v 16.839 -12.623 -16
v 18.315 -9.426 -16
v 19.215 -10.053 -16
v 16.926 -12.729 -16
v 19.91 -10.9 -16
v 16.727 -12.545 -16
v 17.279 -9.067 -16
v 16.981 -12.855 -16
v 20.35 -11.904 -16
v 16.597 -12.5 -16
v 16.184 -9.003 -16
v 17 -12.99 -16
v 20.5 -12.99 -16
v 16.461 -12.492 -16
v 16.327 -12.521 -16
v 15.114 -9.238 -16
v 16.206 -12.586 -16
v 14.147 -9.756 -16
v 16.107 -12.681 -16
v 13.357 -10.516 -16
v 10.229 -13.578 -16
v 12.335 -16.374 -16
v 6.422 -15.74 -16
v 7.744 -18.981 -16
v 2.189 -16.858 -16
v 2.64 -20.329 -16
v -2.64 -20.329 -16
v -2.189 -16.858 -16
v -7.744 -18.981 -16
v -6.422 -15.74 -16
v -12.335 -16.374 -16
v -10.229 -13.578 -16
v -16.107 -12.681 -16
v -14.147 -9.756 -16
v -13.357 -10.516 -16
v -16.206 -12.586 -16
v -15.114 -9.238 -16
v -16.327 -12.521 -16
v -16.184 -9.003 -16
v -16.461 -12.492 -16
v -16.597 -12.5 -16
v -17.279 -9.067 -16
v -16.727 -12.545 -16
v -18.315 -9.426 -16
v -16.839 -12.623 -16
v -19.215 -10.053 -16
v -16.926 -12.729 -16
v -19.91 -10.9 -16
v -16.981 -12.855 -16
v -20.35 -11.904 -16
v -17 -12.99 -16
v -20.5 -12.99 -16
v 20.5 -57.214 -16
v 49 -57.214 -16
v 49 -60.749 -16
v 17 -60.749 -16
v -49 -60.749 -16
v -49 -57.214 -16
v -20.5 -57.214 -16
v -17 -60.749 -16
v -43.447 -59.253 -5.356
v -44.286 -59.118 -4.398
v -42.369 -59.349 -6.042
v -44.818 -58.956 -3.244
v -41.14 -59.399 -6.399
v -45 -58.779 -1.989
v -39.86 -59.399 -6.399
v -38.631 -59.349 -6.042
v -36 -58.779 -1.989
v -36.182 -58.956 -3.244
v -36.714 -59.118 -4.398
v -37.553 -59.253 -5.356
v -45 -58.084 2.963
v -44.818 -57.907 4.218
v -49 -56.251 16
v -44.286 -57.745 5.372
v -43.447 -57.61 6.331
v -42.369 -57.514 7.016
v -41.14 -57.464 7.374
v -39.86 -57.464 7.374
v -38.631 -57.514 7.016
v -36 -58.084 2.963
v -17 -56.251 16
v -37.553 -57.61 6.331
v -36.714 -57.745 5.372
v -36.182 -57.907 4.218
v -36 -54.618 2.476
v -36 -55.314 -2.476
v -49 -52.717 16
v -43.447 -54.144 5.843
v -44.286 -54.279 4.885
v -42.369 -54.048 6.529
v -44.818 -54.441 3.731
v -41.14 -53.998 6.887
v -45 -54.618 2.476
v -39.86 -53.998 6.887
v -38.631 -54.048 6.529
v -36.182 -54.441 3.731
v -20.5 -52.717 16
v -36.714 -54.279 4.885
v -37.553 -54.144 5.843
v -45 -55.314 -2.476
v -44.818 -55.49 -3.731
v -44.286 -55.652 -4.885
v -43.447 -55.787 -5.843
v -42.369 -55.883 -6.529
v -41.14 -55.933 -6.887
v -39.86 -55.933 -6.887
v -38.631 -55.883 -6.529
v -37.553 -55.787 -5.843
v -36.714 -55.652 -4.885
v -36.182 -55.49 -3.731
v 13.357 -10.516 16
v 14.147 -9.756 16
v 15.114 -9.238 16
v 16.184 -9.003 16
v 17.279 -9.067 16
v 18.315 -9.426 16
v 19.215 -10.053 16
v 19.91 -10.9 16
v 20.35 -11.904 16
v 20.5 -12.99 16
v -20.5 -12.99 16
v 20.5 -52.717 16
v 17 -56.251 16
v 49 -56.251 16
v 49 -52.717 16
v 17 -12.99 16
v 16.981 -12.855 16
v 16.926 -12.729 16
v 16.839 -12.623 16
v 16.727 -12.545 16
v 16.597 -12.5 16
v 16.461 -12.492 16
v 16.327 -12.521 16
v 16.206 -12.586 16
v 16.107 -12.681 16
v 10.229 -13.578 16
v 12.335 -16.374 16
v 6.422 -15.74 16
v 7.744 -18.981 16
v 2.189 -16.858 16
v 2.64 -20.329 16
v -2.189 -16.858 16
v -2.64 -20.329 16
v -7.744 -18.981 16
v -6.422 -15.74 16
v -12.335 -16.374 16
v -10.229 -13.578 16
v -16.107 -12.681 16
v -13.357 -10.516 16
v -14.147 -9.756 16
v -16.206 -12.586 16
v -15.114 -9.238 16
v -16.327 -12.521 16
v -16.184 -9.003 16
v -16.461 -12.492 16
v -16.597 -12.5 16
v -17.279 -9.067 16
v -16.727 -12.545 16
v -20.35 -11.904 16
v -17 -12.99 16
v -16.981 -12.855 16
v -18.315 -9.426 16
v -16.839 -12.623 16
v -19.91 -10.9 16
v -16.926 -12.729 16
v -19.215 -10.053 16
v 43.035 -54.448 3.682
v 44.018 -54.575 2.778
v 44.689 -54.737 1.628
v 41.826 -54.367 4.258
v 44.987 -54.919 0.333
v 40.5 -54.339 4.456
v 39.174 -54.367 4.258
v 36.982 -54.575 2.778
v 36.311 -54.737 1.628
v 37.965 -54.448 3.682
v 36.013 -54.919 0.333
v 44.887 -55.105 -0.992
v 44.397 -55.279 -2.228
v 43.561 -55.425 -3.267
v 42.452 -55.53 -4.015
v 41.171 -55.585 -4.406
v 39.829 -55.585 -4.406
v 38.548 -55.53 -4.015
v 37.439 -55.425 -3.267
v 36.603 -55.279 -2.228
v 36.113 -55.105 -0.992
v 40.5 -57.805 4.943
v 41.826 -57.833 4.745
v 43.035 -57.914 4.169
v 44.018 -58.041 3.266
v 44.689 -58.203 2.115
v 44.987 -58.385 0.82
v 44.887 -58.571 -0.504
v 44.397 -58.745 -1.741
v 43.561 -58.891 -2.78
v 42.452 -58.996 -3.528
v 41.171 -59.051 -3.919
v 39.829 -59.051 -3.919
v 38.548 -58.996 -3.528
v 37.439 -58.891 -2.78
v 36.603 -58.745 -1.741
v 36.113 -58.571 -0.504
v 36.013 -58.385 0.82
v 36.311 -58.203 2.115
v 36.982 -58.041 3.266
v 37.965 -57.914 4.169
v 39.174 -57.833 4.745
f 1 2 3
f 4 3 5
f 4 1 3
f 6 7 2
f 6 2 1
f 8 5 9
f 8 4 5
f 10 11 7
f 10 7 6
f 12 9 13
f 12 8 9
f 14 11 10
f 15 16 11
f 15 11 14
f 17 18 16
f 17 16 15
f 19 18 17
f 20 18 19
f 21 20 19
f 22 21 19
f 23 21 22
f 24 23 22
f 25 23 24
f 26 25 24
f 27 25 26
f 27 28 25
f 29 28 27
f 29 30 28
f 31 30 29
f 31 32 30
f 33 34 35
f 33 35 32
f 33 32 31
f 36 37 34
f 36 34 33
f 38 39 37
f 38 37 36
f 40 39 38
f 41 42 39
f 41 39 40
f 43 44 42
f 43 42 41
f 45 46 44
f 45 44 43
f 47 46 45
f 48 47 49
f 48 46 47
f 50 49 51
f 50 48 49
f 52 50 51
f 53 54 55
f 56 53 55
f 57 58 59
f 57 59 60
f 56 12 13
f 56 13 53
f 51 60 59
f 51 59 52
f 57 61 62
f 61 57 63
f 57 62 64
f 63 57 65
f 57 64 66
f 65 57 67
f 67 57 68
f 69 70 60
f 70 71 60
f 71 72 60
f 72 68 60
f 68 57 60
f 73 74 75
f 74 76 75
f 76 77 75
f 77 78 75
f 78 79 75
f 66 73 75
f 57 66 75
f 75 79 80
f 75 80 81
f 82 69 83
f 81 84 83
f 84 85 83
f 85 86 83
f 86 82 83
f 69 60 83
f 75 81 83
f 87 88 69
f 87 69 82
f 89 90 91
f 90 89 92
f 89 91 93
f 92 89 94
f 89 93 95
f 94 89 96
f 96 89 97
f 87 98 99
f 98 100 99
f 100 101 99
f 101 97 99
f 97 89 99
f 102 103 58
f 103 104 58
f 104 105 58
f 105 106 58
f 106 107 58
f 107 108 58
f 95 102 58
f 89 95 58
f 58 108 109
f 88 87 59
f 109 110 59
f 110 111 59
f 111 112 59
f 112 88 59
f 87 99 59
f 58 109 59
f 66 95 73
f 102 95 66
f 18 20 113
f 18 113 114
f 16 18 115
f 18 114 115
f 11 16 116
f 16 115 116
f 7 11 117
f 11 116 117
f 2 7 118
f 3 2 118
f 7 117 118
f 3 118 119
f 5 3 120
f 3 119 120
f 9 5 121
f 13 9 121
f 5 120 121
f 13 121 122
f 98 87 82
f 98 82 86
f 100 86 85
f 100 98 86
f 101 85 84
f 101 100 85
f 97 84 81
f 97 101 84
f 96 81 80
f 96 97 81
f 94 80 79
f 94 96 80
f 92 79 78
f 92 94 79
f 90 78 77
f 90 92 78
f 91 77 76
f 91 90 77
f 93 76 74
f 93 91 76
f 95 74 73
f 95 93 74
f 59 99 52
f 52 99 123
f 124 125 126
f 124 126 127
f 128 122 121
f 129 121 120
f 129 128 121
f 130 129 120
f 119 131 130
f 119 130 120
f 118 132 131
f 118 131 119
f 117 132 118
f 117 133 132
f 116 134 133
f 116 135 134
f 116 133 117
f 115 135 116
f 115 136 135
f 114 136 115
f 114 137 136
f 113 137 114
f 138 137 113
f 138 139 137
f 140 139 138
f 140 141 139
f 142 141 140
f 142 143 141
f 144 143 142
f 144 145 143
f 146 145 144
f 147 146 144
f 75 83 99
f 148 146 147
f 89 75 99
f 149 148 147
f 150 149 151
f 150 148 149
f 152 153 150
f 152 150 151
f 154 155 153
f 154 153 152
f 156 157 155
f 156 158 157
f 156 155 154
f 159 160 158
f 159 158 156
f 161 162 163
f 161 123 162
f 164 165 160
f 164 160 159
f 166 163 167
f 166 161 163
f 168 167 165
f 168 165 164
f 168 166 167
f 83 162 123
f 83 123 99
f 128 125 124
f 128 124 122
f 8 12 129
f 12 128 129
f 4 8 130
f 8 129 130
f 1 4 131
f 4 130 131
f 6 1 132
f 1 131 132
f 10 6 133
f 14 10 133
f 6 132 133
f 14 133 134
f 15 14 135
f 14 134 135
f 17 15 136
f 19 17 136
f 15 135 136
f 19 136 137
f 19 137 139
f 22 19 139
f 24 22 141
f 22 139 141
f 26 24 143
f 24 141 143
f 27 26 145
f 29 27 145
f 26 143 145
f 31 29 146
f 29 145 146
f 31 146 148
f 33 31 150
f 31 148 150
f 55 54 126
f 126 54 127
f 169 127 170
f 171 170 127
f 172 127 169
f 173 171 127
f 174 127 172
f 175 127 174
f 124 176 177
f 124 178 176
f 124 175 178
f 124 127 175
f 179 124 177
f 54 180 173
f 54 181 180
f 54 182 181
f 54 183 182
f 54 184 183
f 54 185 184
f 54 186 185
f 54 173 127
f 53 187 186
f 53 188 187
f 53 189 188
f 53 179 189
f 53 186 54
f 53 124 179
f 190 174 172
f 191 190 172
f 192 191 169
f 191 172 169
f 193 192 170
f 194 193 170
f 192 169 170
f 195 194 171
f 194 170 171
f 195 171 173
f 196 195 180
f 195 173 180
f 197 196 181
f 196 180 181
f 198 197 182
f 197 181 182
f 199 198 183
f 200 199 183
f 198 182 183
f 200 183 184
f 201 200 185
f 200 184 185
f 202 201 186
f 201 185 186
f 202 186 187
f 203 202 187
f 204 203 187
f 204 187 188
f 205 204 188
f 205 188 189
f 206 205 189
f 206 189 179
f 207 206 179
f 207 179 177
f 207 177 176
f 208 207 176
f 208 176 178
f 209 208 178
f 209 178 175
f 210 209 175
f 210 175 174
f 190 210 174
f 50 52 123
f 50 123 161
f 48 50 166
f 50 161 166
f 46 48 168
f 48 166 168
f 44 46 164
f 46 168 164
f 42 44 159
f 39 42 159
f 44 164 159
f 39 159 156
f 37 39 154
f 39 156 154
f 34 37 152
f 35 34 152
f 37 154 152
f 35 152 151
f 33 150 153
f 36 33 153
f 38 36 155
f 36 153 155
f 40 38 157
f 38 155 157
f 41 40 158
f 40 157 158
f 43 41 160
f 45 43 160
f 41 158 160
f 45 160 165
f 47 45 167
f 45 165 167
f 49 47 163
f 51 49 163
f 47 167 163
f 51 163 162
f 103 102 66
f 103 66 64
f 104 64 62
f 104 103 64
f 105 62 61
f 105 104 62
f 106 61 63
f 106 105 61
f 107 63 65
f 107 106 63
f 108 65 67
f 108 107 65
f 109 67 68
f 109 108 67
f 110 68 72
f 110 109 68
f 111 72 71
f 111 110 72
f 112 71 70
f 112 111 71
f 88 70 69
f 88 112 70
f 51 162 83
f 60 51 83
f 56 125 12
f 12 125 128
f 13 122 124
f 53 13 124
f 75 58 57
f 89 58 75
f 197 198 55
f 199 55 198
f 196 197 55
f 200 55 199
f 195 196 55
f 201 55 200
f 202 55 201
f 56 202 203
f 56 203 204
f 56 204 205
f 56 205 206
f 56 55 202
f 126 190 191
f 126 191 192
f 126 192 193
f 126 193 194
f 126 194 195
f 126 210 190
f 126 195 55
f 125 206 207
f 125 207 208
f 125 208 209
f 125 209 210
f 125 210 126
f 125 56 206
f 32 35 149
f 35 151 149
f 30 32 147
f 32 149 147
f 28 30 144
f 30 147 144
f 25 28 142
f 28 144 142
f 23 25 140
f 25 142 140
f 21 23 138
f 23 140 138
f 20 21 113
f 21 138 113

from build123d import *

# Parameters (mm, degrees)
EXTRUDE_1_DEPTH     = 16
CUT_EXTRUDE_1_DEPTH = 50
EXTRUDE_2_DEPTH     = 28.5
SKETCH_4_R          = 4.5
CUT_EXTRUDE_2_DEPTH = 28.5


with BuildPart() as part:
    # 草图1 → 凸台-拉伸1 (new, symmetric)
    with BuildSketch(Plane.XY):
        with BuildLine():
            Line((-17, -12.990381057), (-17, -66.86388681))
            Line((-17, -66.86388681), (-20.5, -66.86388681))
            Line((-20.5, -66.86388681), (-20.5, -12.990381057))
            ThreePointArc((-20.5, -12.990381057), (-17.809307341, -9.210736327), (-13.357142857, -10.51602276))
            ThreePointArc((-13.357142857, -10.51602276), (0, -17), (13.357142857, -10.51602276))
            ThreePointArc((13.357142857, -10.51602276), (17.809307341, -9.210736327), (20.5, -12.990381057))
            Line((20.5, -12.990381057), (20.5, -66.86388681))
            Line((20.5, -66.86388681), (17, -66.86388681))
            Line((17, -66.86388681), (17, -12.990381057))
            ThreePointArc((17, -12.990381057), (16.663663418, -12.517925466), (16.107142857, -12.68108627))
            ThreePointArc((16.107142857, -12.68108627), (0, -20.5), (-16.107142857, -12.68108627))
            ThreePointArc((-16.107142857, -12.68108627), (-16.663663418, -12.517925466), (-17, -12.990381057))
        make_face()
    extrude(amount=EXTRUDE_1_DEPTH, both=True)

    # 草图2 → 切除-拉伸1 (cut, symmetric)
    with BuildSketch(Plane(origin=(0, 0, 0), x_dir=(0, 0, -1), z_dir=(1, 0, 0))):
        Polygon((16, -60.748653355), (-16, -56.251346645), (-16, -66.86388681), (16, -66.86388681), align=None)
    extrude(amount=CUT_EXTRUDE_1_DEPTH, both=True, mode=Mode.SUBTRACT)

    # 草图3 → 凸台-拉伸2 (add)
    with BuildSketch(Plane.ZY.offset(20.5)):
        Polygon((-16, -60.748653355), (16, -56.251346645), (16, -52.716950141), (-16, -57.214256851), align=None)
    extrude_2 = extrude(amount=EXTRUDE_2_DEPTH)

    # 镜向1: 凸台-拉伸2 across plane
    add(extrude_2.mirror(Plane(origin=(0, 0, 0), x_dir=(0, 0, 1), z_dir=(1, 0, 0))))

    # 草图4 → 切除-拉伸2 (cut)
    with BuildSketch(Plane(origin=(0, -53.900966366, 7.575286804), x_dir=(1, 0, 0), z_dir=(0, 0.9902680687415715, -0.13917310096005808))):
        with Locations(Location((40.5, 7.649733485, 0), (0, 0, 270))):
            Circle(SKETCH_4_R)
        with BuildLine():
            Line((-36, 10.149733485), (-36, 5.149733485))
            ThreePointArc((-36, 5.149733485), (-40.5, 0.649733485), (-45, 5.149733485))
            Line((-45, 5.149733485), (-45, 10.149733485))
            ThreePointArc((-45, 10.149733485), (-40.5, 14.649733485), (-36, 10.149733485))
        make_face()
    extrude(amount=-CUT_EXTRUDE_2_DEPTH, mode=Mode.SUBTRACT)


solid = part.part
